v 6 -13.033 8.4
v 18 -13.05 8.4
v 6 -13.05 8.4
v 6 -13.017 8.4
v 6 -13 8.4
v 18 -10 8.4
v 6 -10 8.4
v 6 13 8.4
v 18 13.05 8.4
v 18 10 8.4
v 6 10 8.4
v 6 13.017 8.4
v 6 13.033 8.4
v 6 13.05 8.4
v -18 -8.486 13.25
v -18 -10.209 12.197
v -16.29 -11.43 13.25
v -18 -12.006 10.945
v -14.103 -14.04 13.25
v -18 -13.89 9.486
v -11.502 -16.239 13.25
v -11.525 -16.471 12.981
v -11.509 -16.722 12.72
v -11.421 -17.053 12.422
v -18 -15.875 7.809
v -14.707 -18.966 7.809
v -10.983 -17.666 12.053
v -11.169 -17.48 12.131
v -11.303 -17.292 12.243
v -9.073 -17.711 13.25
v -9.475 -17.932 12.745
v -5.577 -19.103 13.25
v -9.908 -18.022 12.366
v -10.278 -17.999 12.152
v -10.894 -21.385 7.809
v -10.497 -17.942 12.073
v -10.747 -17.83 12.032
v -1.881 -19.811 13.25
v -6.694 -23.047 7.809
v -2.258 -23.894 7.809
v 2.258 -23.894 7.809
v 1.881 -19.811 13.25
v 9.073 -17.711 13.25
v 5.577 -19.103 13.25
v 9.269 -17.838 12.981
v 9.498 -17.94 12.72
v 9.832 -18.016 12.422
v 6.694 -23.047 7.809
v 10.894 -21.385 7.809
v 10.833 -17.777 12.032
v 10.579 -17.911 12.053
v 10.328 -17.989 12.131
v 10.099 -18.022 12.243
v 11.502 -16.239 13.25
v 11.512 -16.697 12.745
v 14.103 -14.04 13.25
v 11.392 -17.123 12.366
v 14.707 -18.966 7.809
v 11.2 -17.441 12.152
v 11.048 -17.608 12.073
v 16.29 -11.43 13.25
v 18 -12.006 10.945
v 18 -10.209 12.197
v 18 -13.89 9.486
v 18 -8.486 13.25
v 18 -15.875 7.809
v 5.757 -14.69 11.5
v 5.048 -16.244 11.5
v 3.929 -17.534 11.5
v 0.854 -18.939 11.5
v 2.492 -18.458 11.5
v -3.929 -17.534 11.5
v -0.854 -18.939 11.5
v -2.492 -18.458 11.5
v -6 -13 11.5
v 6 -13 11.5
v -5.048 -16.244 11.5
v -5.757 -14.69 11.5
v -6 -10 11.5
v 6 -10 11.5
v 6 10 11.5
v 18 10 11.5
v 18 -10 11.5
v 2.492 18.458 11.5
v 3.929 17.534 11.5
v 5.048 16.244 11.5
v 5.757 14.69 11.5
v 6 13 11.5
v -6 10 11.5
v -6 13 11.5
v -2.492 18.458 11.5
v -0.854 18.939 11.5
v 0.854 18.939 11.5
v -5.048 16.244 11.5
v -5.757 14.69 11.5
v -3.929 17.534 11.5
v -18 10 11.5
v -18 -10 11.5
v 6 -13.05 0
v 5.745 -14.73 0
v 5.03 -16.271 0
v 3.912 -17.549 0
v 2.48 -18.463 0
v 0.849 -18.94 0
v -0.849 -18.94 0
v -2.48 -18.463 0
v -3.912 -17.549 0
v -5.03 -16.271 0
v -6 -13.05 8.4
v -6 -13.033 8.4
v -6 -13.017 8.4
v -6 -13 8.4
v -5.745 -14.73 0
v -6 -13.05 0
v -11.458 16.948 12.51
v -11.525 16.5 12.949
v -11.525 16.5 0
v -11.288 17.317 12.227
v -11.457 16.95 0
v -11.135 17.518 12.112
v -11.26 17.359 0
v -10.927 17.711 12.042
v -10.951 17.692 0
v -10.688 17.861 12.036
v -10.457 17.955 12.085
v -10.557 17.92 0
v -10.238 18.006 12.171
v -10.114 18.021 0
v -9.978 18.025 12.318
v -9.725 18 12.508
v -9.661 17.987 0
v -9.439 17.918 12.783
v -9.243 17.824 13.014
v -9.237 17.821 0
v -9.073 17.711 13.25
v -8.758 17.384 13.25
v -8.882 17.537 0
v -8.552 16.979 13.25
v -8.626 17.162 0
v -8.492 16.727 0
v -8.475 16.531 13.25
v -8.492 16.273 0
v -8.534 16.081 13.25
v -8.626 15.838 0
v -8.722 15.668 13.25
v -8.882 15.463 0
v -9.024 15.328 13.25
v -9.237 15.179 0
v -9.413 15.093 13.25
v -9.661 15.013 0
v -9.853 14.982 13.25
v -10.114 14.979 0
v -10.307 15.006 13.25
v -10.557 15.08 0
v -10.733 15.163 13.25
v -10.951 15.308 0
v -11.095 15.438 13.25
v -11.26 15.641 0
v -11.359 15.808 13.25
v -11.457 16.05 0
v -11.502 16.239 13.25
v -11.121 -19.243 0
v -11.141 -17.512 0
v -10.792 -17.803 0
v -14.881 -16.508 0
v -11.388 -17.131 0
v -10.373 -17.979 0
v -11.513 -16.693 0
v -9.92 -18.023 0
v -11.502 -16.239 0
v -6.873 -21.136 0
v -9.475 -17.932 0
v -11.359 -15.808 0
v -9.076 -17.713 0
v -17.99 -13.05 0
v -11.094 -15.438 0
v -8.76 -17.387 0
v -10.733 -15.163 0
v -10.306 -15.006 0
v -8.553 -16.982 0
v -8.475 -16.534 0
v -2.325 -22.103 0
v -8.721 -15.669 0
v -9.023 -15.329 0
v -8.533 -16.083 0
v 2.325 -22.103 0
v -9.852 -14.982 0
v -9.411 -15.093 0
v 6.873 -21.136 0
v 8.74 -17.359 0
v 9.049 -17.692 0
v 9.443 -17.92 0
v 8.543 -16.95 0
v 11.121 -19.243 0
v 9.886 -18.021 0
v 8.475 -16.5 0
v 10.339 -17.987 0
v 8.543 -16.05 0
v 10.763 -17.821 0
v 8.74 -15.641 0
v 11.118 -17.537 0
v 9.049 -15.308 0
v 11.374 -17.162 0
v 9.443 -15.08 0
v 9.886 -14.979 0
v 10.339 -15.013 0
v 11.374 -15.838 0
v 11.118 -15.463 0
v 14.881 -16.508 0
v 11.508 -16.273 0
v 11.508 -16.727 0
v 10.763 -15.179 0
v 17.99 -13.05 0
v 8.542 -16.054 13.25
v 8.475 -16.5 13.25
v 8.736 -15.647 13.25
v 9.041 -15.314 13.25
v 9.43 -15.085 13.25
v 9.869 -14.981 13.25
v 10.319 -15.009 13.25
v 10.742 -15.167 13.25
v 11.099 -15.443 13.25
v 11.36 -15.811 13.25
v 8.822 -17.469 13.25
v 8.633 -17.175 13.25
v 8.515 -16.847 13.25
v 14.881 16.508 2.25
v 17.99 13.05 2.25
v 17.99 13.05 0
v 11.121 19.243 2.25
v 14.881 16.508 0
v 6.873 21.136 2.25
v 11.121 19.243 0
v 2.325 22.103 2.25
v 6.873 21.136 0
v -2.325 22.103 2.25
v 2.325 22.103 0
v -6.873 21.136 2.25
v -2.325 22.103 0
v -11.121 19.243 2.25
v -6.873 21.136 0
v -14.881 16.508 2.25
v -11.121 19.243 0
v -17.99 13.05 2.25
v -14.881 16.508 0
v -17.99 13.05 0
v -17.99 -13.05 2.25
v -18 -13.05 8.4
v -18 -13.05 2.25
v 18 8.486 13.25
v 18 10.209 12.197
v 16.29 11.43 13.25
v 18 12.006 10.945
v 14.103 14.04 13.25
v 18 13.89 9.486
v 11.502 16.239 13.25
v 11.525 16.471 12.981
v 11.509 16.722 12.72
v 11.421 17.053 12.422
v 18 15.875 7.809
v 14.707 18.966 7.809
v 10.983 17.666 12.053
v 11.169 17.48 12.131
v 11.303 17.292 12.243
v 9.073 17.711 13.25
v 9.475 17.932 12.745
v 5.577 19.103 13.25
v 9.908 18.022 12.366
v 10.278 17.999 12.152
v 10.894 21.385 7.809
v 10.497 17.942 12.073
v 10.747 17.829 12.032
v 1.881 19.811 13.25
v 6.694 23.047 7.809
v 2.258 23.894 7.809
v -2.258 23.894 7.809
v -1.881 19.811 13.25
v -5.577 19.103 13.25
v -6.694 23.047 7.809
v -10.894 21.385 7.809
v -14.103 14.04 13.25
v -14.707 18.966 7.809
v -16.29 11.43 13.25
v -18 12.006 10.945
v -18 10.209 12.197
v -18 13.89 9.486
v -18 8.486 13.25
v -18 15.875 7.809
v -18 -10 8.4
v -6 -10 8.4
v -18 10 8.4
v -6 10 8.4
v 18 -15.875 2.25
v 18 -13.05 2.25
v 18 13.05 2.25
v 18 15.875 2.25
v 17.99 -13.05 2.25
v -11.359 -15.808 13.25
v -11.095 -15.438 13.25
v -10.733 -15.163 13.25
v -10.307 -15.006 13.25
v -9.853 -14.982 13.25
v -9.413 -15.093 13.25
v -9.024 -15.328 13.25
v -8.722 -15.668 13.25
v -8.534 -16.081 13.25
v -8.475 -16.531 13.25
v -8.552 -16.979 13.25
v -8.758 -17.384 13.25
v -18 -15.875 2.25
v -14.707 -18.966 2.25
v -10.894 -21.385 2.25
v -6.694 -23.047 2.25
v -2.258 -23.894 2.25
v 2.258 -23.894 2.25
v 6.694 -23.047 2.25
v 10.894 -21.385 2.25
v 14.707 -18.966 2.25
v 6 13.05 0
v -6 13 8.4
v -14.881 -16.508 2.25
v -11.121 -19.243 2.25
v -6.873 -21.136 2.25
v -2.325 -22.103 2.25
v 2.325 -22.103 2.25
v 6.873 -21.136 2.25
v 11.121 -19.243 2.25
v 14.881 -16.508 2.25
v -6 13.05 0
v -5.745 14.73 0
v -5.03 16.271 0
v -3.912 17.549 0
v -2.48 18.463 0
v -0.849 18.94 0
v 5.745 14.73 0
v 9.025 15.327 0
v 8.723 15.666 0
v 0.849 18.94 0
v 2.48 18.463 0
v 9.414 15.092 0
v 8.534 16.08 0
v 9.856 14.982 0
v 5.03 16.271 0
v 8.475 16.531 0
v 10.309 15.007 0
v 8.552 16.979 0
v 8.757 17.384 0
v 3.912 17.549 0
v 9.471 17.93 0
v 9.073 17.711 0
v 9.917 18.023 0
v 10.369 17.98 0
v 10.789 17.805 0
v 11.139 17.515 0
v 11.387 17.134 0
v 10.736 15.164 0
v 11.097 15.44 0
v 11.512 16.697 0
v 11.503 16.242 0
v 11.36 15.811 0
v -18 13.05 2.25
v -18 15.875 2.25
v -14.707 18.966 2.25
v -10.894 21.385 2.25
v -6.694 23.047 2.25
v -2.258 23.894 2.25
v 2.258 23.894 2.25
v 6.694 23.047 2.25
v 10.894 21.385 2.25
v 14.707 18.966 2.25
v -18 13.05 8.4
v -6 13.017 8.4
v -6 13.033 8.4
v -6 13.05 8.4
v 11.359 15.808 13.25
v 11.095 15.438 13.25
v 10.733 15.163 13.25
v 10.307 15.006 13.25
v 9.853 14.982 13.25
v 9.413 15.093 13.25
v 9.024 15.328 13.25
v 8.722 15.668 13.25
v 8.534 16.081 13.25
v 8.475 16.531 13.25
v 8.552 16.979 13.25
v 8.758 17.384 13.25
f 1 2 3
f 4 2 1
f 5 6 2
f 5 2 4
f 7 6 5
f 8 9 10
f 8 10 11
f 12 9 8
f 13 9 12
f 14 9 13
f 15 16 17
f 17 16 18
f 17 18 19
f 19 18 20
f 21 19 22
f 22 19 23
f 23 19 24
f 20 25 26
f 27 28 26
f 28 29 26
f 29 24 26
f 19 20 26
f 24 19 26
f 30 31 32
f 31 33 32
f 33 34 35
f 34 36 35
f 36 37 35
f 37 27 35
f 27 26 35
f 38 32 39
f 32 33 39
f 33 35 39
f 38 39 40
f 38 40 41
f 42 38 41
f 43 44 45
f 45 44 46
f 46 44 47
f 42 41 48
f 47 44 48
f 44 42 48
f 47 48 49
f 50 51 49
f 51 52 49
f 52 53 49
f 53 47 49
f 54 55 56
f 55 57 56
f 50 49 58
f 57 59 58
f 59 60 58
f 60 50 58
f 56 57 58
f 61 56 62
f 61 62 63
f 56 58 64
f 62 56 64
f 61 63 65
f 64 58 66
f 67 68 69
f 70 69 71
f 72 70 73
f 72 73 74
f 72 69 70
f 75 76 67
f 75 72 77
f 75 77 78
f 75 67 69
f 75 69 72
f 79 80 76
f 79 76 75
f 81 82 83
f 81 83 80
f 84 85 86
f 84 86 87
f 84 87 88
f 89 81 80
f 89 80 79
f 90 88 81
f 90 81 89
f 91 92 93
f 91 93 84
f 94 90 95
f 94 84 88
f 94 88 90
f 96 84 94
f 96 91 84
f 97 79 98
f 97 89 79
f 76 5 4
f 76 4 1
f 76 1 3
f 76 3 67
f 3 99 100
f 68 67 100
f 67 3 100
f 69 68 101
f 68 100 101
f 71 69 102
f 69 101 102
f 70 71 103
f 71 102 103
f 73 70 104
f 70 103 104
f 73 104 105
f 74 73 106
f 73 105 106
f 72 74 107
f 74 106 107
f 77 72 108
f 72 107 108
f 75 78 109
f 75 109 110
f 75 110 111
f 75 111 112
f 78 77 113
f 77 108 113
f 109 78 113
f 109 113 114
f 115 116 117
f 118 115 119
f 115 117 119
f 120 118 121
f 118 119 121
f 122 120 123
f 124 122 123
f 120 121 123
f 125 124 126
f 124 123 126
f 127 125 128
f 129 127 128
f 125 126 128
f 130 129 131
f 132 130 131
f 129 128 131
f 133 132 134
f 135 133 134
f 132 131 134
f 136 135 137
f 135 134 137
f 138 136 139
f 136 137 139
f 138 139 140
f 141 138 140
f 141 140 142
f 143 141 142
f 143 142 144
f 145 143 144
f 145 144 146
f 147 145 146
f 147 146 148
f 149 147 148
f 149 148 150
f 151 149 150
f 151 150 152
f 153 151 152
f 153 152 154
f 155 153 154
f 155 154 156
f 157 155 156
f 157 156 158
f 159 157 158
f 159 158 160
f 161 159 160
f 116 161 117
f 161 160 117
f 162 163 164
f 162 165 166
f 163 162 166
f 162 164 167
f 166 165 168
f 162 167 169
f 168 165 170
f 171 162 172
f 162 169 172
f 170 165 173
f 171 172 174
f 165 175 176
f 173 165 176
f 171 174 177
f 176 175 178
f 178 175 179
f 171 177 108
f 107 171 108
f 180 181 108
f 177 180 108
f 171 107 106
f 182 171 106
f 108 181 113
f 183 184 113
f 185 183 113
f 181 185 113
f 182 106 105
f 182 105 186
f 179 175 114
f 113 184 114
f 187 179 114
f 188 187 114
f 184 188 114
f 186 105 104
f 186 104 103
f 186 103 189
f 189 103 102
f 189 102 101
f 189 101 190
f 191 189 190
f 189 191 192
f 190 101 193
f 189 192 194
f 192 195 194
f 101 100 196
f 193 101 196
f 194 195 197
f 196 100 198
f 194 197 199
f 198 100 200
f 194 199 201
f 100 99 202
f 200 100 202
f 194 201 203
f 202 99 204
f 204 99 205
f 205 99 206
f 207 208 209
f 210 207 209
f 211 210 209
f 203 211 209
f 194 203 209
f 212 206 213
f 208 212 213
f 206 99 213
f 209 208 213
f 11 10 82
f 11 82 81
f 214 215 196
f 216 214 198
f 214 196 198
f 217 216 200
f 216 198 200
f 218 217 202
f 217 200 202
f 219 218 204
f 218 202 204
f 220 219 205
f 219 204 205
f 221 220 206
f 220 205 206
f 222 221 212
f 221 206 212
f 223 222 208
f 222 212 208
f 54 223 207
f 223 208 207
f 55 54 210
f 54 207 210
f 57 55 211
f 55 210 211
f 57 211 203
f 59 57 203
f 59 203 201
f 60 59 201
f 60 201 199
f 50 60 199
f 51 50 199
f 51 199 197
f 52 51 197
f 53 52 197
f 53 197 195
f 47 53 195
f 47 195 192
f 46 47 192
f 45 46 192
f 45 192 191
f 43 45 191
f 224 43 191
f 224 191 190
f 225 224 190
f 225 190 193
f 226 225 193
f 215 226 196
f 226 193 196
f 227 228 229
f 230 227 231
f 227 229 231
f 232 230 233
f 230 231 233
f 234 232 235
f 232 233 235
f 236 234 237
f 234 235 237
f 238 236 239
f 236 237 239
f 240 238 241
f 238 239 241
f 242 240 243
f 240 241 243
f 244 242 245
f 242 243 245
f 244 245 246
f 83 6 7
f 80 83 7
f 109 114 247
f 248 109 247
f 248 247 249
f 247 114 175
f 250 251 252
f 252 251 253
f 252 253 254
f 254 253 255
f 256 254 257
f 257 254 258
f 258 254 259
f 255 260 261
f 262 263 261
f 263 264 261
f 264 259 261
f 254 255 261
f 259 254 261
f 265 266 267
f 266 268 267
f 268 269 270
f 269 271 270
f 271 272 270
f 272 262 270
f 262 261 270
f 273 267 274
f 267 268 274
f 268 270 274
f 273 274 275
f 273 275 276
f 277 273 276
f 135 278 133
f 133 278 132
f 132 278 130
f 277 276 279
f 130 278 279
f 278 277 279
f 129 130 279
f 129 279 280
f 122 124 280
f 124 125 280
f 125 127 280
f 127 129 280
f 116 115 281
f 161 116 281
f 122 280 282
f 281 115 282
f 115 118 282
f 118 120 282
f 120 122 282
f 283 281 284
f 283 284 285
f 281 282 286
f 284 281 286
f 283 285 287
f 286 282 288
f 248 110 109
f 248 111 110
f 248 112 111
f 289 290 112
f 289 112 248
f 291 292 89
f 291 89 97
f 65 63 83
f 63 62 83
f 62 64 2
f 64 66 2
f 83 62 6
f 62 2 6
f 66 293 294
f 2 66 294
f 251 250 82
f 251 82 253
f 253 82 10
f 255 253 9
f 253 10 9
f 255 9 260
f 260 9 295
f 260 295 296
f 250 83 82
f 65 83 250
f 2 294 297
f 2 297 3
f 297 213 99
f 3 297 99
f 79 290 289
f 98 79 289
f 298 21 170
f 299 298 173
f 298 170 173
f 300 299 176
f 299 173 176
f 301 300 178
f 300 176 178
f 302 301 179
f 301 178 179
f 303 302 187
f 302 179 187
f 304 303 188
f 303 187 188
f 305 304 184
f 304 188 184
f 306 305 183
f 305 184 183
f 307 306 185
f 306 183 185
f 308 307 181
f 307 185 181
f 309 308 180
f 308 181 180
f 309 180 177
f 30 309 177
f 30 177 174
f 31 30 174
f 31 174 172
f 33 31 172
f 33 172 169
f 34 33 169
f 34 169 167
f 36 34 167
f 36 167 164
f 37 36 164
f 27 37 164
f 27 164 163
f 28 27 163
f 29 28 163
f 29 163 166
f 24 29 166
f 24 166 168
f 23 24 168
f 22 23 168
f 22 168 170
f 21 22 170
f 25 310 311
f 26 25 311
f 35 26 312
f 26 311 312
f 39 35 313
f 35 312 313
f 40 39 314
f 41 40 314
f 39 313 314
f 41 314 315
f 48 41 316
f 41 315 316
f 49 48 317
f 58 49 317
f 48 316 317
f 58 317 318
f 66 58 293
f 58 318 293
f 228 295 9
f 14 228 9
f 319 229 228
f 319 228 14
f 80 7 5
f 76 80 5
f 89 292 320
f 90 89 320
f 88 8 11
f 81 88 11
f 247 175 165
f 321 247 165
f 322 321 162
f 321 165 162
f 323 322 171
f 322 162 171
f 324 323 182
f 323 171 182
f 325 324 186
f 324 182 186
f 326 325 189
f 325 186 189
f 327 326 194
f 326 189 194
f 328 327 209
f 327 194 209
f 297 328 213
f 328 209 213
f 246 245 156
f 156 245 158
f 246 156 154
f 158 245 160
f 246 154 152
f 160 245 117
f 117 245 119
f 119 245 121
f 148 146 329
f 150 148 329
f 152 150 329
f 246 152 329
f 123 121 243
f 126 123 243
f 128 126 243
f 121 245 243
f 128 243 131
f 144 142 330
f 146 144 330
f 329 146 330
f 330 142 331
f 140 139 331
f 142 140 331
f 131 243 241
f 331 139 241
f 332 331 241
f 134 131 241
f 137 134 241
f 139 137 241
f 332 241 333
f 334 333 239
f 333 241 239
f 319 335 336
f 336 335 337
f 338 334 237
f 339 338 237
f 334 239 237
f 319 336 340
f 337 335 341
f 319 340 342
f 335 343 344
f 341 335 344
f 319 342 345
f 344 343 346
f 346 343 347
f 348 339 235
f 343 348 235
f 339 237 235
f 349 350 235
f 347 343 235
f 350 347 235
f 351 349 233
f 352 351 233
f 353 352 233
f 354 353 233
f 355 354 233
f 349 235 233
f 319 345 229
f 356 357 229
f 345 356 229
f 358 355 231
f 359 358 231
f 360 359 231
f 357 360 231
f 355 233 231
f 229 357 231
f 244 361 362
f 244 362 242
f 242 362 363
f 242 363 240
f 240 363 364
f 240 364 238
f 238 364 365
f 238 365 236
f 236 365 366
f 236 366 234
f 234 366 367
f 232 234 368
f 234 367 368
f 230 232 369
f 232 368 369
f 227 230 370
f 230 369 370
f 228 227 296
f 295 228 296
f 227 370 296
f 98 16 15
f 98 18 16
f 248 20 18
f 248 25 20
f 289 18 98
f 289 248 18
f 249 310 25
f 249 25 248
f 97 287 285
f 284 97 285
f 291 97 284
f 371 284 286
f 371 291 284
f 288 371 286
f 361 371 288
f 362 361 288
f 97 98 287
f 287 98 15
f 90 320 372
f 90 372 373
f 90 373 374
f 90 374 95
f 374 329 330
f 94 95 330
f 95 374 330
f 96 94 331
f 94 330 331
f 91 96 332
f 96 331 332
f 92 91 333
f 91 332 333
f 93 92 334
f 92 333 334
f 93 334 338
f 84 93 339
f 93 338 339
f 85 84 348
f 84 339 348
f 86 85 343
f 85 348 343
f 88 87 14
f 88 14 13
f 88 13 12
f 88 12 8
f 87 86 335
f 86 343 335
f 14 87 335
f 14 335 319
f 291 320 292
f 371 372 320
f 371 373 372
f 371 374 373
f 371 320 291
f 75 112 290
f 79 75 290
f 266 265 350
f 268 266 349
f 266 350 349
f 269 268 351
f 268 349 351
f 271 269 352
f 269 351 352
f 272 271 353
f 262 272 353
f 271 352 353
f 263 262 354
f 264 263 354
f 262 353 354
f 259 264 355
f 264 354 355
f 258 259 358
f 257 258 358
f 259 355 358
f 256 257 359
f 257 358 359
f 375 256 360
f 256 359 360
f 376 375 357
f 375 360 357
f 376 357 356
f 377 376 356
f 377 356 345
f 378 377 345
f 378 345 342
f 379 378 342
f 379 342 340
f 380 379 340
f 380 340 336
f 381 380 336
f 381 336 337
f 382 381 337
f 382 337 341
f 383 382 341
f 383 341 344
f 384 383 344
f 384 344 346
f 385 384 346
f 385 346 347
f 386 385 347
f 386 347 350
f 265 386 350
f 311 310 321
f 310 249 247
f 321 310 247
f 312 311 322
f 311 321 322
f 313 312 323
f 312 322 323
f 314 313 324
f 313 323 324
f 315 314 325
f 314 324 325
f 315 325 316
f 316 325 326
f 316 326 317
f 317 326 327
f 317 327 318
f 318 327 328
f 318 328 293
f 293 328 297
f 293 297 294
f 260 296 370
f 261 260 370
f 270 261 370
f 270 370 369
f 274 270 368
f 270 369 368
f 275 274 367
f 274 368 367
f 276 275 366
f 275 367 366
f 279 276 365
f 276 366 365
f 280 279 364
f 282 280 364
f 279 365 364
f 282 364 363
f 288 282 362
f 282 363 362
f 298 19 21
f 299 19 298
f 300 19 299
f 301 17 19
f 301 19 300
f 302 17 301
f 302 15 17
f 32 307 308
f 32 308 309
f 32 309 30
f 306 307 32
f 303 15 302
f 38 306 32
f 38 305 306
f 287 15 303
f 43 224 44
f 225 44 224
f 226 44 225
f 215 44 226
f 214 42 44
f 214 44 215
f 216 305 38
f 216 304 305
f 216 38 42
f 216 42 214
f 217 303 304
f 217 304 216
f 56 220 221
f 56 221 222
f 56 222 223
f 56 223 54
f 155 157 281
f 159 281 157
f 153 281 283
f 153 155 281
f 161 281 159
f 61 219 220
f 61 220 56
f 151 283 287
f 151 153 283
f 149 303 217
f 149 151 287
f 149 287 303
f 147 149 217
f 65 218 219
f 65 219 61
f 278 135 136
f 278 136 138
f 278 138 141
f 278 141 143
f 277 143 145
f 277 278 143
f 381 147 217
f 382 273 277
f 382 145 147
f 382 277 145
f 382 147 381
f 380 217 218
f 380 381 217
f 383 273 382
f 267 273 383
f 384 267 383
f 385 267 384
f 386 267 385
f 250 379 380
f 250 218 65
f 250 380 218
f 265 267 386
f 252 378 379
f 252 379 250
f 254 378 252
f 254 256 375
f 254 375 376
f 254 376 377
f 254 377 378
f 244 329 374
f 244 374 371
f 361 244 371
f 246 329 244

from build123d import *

# Parameters (mm, degrees)
EXTRUDE1_DEPTH     = 2.25
EXTRUDE2_DEPTH     = 11
CHAMFER1_SIZE      = 4.1
CHAMFER1_SIZE2     = 5.440883769
SKETCH6_W          = 60
SKETCH6_H          = 26.1
CUT_EXTRUDE1_DEPTH = 8.4
SKETCH9_W          = 10
SKETCH9_H          = 40
CUT_EXTRUDE3_DEPTH = 37.143991781
SKETCH10_W         = 44
SKETCH10_H         = 20
CUT_EXTRUDE4_DEPTH = 3.1
CUT_EXTRUDE8_REACH = 34.796
SKETCH16_R         = 1.525
CUT_EXTRUDE9_DEPTH = 33.795769544


with BuildPart() as part:
    # Sketch1 → Extrude1 (new body)
    with BuildSketch(Plane.XY):
        with BuildLine():
            ThreePointArc((-22.224984725, -0.026057486), (0.013028745, -22.224996181), (22.225, 0))
            ThreePointArc((22.225, 0), (-0.013028745, 22.224996181), (-22.224984725, -0.026057486))
        make_face()
    extrude(amount=EXTRUDE1_DEPTH)

    # Sketch2 → Extrude2 (add)
    with BuildSketch(Plane.XY.offset(2.25)):
        with BuildLine():
            ThreePointArc((-23.999872331, -0.078282234), (0.113586787, -23.999731208), (23.999538151, 0.148891095))
            ThreePointArc((23.999538151, 0.148891095), (-0.113586787, 23.999731208), (-23.999872331, -0.078282234))
        make_face()
    extrude(amount=EXTRUDE2_DEPTH)

    # Chamfer1
    chamfer1_edges = [part.edges().sort_by_distance(p)[0] for p in [
        (-23.999538151, -0.148891095, 13.25),
    ]]
    chamfer1_side = [part.faces().sort_by_distance(p)[0] for p in [
        (0, 0, 13.25),
    ]]
    chamfer(chamfer1_edges, length=CHAMFER1_SIZE, length2=CHAMFER1_SIZE2, reference=chamfer1_side[0])

    # Sketch6 → Cut-Extrude1 (cut)
    with BuildSketch(Plane(origin=(0, 0, 0), x_dir=(-1, 0, 0), z_dir=(0, 0, -1))):
        Rectangle(SKETCH6_W, SKETCH6_H)
    extrude(amount=-CUT_EXTRUDE1_DEPTH, mode=Mode.SUBTRACT)

    # Sketch9 → Cut-Extrude3 (cut, through all)
    with BuildSketch(Plane(origin=(0, 0, 0), x_dir=(-1, 0, 0), z_dir=(0, 0, -1))):
        with Locations((-23, 0)):
            Rectangle(SKETCH9_W, SKETCH9_H)
        with Locations((23, 0)):
            Rectangle(SKETCH9_W, SKETCH9_H)
    extrude(amount=-CUT_EXTRUDE3_DEPTH, mode=Mode.SUBTRACT)

    # Sketch10 → Cut-Extrude4 (cut)
    with BuildSketch(Plane(origin=(0, 0, 8.4), x_dir=(-1, 0, 0), z_dir=(0, 0, -1))):
        Rectangle(SKETCH10_W, SKETCH10_H)
    extrude(amount=-CUT_EXTRUDE4_DEPTH, mode=Mode.SUBTRACT)

    # Cut-Extrude8: up to this face of the body (flat: up to its plane)
    cut_extrude8_end = Plane(part.part.faces().sort_by_distance((0, 0, 11.5))[0])
    # Sketch15 → Cut-Extrude8 (cut, up to the picked face)
    with BuildSketch(Plane(origin=(0, 0, 0), x_dir=(-1, 0, 0), z_dir=(0, 0, -1)), mode=Mode.PRIVATE) as cut_extrude8_sk1:
        with BuildLine():
            Line((6, -13), (6, 13))
            ThreePointArc((6, 13), (0, 19), (-6, 13))
            Line((-6, 13), (-6, -13))
            ThreePointArc((-6, -13), (0, -19), (6, -13))
        make_face()
    cut_extrude8_tool1 = split(extrude(cut_extrude8_sk1.sketch, amount=-CUT_EXTRUDE8_REACH, mode=Mode.PRIVATE), bisect_by=cut_extrude8_end, keep=Keep.BOTH, mode=Mode.PRIVATE)
    add(cut_extrude8_tool1.solids().sort_by(Axis((0, 0, 0), (0, 0, 1)))[0], mode=Mode.SUBTRACT)

    # Sketch16 → Cut-Extrude9 (cut, through all)
    with BuildSketch(Plane(origin=(0, 0, 0), x_dir=(-1, 0, 0), z_dir=(0, 0, -1))):
        with Locations((-10, -16.5)):
            Circle(SKETCH16_R)
        with Locations(Location((10, -16.5, 0), (0, 0, 9.857274388))):
            Circle(SKETCH16_R)
        with Locations((10, 16.5)):
            Circle(SKETCH16_R)
        with Locations(Location((-10, 16.5, 0), (0, 0, 52.579530574))):
            Circle(SKETCH16_R)
    extrude(amount=-CUT_EXTRUDE9_DEPTH, mode=Mode.SUBTRACT)


solid = part.part
